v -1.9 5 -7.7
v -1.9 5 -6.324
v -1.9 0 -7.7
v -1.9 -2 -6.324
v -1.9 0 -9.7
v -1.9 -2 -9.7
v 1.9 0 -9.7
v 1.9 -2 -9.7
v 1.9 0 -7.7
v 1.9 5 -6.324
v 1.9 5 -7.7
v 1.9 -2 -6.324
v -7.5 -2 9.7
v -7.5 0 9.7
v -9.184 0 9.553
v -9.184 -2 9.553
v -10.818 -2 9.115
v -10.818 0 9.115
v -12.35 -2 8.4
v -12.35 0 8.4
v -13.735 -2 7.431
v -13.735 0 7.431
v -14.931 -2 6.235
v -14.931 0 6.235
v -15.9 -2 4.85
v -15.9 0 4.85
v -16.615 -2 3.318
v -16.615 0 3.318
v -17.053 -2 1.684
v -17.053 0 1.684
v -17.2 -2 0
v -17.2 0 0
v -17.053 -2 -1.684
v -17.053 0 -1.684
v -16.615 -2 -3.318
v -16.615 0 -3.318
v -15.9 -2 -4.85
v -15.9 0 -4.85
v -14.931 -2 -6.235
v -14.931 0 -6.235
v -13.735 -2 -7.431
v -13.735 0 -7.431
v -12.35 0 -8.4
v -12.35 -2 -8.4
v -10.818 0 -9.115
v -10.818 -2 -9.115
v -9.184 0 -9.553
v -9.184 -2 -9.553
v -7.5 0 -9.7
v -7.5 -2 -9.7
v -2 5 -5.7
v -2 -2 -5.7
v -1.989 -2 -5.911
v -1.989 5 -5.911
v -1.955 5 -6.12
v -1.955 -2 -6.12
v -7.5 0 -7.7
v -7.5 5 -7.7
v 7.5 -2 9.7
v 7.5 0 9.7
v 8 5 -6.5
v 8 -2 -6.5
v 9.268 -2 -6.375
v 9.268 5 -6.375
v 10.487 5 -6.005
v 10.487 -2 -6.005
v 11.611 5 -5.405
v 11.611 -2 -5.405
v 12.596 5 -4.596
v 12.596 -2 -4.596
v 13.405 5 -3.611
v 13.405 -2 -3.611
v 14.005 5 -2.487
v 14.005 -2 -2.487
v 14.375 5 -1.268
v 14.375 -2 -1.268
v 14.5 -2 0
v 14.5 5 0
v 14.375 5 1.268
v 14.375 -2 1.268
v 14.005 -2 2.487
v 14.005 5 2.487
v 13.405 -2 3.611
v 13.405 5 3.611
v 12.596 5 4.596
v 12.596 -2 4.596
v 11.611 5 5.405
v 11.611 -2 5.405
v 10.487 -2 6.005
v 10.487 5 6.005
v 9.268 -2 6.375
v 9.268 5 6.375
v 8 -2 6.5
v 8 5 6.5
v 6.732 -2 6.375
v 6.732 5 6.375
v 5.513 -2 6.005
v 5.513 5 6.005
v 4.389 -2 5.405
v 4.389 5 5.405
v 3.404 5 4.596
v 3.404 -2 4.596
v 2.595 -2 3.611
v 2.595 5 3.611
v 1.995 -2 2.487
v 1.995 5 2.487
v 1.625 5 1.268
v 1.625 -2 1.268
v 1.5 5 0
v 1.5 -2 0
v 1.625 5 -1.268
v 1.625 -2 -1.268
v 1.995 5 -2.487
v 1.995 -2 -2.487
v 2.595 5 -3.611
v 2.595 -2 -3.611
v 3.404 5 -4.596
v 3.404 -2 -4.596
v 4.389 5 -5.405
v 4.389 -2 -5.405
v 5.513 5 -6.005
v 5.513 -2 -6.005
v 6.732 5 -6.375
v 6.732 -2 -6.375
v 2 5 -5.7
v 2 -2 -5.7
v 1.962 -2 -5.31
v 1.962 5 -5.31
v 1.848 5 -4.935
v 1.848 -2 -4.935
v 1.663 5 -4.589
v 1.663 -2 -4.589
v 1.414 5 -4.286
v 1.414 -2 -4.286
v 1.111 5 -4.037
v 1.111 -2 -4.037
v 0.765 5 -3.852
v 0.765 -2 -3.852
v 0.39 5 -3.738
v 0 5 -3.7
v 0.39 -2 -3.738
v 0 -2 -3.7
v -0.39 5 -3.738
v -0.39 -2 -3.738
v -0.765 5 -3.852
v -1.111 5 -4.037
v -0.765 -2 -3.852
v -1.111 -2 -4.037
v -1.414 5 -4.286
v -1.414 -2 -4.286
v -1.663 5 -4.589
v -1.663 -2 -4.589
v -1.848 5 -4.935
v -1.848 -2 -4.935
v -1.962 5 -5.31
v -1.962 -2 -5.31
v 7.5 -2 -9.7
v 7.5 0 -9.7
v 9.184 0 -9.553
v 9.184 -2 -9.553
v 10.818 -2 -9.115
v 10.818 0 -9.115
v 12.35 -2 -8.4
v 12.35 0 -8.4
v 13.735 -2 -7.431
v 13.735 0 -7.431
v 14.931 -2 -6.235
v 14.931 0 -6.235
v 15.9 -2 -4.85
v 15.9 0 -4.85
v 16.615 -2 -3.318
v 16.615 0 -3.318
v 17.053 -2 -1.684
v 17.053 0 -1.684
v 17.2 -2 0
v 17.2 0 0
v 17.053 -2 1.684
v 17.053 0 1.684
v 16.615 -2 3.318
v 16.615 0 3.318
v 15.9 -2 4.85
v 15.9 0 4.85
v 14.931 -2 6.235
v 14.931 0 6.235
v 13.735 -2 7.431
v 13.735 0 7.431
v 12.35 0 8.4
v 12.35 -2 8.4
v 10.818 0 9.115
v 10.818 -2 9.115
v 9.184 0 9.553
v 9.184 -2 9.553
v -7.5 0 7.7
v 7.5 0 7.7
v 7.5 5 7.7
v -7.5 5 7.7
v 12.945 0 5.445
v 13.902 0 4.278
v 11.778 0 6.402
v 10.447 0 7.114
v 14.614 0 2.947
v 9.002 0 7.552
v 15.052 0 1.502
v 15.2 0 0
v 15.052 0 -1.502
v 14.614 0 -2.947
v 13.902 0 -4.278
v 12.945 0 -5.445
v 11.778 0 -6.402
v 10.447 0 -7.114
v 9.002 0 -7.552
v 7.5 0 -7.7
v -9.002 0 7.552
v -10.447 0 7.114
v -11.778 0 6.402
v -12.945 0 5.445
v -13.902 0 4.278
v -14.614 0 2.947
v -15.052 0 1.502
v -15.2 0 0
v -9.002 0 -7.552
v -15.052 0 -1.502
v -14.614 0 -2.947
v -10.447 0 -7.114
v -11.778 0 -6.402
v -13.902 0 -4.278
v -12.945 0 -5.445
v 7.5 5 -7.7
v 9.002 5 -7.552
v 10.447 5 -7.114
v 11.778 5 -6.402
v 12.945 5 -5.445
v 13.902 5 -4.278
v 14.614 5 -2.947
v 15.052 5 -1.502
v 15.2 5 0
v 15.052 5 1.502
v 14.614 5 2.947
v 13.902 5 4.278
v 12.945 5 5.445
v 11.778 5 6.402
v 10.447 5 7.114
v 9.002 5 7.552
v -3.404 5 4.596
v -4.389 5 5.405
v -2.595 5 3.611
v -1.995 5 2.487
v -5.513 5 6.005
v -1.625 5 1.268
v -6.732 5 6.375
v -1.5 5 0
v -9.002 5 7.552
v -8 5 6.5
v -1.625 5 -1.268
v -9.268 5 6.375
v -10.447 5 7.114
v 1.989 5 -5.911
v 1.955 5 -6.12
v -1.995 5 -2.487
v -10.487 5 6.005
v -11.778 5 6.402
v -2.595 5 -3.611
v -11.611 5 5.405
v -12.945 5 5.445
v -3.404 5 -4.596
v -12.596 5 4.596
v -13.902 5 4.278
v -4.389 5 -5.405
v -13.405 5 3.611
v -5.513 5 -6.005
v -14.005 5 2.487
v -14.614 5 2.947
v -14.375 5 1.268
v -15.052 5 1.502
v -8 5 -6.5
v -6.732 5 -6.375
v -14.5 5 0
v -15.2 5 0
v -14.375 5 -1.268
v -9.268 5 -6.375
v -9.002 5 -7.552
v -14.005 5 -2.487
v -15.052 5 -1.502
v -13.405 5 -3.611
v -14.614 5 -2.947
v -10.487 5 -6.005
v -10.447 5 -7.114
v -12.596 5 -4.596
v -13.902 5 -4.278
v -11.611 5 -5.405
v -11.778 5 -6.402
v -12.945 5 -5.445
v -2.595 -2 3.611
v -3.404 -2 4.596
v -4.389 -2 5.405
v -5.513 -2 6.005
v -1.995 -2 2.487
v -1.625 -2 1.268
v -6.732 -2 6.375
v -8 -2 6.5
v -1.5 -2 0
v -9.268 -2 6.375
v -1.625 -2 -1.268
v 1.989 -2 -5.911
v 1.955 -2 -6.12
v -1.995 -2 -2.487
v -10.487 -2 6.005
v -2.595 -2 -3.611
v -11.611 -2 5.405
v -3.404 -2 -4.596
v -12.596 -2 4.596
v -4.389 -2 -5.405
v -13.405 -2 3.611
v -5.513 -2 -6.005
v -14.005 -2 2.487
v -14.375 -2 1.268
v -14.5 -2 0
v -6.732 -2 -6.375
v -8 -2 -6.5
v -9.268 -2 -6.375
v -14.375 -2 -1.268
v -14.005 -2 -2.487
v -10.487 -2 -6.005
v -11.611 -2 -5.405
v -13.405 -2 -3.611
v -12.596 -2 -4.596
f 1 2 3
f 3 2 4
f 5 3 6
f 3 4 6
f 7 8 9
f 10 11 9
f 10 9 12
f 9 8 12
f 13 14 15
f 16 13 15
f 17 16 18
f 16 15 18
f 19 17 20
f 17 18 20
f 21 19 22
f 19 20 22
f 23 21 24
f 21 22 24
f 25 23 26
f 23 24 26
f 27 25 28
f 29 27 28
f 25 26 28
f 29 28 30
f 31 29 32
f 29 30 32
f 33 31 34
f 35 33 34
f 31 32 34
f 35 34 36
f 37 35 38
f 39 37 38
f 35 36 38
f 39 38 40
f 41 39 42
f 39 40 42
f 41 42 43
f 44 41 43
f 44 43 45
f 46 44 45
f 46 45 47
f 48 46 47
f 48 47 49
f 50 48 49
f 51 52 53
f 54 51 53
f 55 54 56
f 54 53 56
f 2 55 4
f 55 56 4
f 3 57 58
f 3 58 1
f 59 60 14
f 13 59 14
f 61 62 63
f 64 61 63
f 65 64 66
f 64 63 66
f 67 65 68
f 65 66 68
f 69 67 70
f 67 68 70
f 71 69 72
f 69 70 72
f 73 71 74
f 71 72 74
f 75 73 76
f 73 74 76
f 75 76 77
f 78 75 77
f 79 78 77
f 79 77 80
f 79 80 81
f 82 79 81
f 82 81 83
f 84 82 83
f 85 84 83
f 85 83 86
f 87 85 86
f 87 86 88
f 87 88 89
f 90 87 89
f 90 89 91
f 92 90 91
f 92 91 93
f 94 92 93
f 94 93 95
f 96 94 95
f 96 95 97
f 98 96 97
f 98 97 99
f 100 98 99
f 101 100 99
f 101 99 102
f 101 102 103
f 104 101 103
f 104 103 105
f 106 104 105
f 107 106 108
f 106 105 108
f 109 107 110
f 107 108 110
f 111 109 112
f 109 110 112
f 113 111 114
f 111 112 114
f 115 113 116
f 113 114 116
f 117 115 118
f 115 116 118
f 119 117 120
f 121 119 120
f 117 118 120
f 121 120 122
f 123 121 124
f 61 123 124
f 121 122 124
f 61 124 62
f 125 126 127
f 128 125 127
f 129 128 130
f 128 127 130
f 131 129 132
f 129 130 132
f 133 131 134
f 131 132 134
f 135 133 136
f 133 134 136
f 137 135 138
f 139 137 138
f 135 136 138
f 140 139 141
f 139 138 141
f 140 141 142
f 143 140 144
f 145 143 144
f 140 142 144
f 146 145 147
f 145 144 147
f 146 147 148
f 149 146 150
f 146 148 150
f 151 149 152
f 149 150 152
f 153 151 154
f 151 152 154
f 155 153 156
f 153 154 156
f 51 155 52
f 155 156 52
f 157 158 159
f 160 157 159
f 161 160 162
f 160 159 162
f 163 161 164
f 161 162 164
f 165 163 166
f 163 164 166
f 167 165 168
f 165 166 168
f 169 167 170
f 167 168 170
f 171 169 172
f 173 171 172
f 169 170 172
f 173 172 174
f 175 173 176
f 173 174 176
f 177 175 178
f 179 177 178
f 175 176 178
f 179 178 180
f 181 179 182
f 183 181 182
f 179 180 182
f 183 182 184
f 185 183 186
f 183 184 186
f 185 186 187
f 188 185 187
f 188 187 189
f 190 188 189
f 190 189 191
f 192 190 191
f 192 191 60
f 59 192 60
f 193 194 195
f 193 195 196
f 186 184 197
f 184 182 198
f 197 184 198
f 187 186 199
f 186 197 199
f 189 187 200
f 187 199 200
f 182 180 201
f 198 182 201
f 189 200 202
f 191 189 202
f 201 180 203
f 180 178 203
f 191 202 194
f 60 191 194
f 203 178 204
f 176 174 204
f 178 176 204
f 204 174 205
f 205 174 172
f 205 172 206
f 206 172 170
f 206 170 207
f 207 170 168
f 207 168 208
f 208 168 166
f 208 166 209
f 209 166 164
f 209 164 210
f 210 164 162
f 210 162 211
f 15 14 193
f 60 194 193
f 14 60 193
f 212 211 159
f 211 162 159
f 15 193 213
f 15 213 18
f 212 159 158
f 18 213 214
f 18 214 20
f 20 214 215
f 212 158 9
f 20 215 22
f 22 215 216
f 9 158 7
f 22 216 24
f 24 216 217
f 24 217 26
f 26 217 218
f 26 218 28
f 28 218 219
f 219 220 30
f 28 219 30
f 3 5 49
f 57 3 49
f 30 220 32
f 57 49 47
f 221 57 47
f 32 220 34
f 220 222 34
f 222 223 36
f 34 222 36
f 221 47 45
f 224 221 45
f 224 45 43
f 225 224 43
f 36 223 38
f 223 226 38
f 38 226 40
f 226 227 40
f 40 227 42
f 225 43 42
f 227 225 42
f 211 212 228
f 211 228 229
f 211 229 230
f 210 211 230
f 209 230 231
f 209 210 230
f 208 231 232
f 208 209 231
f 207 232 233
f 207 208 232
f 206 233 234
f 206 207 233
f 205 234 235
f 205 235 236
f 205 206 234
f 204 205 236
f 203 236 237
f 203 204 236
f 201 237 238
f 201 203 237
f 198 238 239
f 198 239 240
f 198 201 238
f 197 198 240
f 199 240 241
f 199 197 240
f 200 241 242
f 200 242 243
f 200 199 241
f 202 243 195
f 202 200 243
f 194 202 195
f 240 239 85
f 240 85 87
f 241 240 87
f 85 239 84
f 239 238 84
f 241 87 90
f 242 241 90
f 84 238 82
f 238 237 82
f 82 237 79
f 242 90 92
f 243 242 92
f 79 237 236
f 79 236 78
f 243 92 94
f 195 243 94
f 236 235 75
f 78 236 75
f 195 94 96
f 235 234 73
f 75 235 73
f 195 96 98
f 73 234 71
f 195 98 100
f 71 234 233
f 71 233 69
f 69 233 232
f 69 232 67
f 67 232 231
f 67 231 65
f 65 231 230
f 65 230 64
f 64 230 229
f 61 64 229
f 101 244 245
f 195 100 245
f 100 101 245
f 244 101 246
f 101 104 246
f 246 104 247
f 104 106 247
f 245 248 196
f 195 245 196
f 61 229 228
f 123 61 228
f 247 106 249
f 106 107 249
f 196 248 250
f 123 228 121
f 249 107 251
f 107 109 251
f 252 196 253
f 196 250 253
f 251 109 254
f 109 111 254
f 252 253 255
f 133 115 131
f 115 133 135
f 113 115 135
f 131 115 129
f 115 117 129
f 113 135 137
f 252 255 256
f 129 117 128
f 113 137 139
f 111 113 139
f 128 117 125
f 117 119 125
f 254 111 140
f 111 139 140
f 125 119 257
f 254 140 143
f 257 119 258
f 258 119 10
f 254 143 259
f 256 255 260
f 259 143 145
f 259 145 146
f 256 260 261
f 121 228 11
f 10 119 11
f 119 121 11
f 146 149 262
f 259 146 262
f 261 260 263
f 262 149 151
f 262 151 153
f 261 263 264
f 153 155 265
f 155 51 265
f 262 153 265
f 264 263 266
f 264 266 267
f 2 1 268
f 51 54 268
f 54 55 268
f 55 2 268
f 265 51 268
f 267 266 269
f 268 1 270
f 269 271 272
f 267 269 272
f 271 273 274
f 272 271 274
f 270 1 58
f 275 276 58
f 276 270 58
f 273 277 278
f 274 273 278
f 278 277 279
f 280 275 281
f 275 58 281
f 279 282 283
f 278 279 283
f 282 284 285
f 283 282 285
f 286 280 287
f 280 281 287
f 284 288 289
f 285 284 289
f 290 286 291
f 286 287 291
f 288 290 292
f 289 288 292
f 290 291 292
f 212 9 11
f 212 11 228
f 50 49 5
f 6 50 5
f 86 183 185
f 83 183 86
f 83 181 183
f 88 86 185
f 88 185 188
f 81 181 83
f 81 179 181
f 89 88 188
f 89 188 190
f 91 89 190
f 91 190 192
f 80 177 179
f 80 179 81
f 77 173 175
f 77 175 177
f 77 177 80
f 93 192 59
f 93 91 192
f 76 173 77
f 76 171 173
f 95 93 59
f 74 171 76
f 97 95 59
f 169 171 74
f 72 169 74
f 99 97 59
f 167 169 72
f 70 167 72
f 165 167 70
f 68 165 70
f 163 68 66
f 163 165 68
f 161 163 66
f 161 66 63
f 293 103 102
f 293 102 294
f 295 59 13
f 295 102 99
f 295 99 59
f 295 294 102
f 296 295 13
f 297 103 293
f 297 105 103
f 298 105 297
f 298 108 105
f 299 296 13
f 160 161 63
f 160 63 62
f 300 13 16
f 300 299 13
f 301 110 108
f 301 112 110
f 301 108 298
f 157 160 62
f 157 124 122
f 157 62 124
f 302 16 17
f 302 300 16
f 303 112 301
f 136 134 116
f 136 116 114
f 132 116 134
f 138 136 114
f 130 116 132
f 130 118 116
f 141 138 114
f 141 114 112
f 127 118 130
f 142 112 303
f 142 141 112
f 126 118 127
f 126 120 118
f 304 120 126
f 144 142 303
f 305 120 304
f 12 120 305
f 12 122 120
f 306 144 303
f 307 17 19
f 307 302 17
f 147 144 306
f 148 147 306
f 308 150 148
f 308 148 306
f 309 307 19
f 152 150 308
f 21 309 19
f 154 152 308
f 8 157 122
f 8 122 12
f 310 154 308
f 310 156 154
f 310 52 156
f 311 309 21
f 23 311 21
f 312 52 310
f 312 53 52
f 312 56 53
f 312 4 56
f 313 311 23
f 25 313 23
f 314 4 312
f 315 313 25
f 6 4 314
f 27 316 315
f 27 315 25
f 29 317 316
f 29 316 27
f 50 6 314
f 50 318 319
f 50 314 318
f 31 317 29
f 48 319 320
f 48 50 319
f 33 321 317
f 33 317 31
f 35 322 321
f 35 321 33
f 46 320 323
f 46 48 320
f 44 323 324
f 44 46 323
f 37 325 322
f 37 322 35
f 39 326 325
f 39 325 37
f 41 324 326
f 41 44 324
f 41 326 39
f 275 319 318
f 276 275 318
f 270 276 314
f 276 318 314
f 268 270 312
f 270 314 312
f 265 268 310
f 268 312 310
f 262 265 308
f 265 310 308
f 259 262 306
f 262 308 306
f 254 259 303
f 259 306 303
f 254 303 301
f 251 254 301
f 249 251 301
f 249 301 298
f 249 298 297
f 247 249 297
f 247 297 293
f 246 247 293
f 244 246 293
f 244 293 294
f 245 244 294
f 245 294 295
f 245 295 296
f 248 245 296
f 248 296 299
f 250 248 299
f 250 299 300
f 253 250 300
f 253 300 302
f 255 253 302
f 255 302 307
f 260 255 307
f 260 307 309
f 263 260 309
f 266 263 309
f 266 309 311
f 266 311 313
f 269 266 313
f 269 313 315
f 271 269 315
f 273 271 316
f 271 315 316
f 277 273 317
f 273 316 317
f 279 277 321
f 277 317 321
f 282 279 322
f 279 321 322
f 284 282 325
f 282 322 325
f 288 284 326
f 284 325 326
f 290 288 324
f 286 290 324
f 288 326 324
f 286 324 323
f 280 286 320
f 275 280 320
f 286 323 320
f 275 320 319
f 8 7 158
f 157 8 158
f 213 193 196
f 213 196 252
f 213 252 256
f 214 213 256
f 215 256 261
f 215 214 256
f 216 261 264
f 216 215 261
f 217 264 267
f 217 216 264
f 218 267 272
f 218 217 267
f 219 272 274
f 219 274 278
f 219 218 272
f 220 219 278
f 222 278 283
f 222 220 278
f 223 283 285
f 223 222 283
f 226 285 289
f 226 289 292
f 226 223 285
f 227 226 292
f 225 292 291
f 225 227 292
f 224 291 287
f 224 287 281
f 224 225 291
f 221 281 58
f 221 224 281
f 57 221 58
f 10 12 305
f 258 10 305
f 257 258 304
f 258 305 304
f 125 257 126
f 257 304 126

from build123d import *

# Parameters (mm, degrees)
EXTRUDE_1_DEPTH     = 2
EXTRUDE_2_DEPTH     = 5
CUT_EXTRUDE_1_REACH = 22.951
SKETCH_3_R          = 6.5


with BuildPart() as part:
    # 草圖2 → 填料-伸長1 (new body)
    with BuildSketch(Plane(origin=(0, 0, 0), x_dir=(1, 0, 0), z_dir=(0, 1, 0))):
        with BuildLine():
            Line((-7.5, 9.7), (7.5, 9.7))
            ThreePointArc((7.5, 9.7), (17.2, 0), (7.5, -9.7))
            Line((7.5, -9.7), (-7.5, -9.7))
            ThreePointArc((-7.5, -9.7), (-17.2, 0), (-7.5, 9.7))
        make_face()
    extrude(amount=-EXTRUDE_1_DEPTH)

    # 草圖1 → 填料-伸長2 (add)
    with BuildSketch(Plane(origin=(0, 0, 0), x_dir=(1, 0, 0), z_dir=(0, 1, 0))):
        with BuildLine():
            Line((-7.5, 7.7), (7.5, 7.7))
            ThreePointArc((7.5, 7.7), (15.2, 0), (7.5, -7.7))
            Line((7.5, -7.7), (-7.5, -7.7))
            ThreePointArc((-7.5, -7.7), (-15.2, 0), (-7.5, 7.7))
        make_face()
    extrude(amount=EXTRUDE_2_DEPTH)

    # 草圖3 → 除料-伸長1 (cut, up to next)
    with BuildSketch(Plane.XZ.offset(2), mode=Mode.PRIVATE) as cut_extrude_1_sk1:
        with Locations(Location((-8, 0, 0), (0, 0, 270))):
            Circle(SKETCH_3_R)
    cut_extrude_1_tool1 = extrude(cut_extrude_1_sk1.sketch, amount=-CUT_EXTRUDE_1_REACH, mode=Mode.PRIVATE) & part.part
    # 草圖3 → 除料-伸長1 (cut, up to next)
    with BuildSketch(Plane.XZ.offset(2), mode=Mode.PRIVATE) as cut_extrude_1_sk2:
        with Locations(Location((8, 0, 0), (0, 0, 270))):
            Circle(SKETCH_3_R)
    cut_extrude_1_tool2 = extrude(cut_extrude_1_sk2.sketch, amount=-CUT_EXTRUDE_1_REACH, mode=Mode.PRIVATE) & part.part
    # 草圖3 → 除料-伸長1 (cut, up to next)
    with BuildSketch(Plane.XZ.offset(2), mode=Mode.PRIVATE) as cut_extrude_1_sk3:
        with BuildLine():
            ThreePointArc((2, -5.7), (0, -3.7), (-2, -5.7))
            Line((-2, -5.7), (2, -5.7))
        make_face()
    cut_extrude_1_tool3 = extrude(cut_extrude_1_sk3.sketch, amount=-CUT_EXTRUDE_1_REACH, mode=Mode.PRIVATE) & part.part
    # 草圖3 → 除料-伸長1 (cut, up to next)
    with BuildSketch(Plane.XZ.offset(2), mode=Mode.PRIVATE) as cut_extrude_1_sk4:
        with BuildLine():
            Line((2, -5.7), (-2, -5.7))
            ThreePointArc((-2, -5.7), (-1.974841766, -6.016227766), (-1.9, -6.3244998))
            Line((-1.9, -6.3244998), (-1.9, -9.7))
            Line((-1.9, -9.7), (1.9, -9.7))
            Line((1.9, -9.7), (1.9, -6.3244998))
            ThreePointArc((1.9, -6.3244998), (1.974841766, -6.016227766), (2, -5.7))
        make_face()
    cut_extrude_1_tool4 = extrude(cut_extrude_1_sk4.sketch, amount=-CUT_EXTRUDE_1_REACH, mode=Mode.PRIVATE) & part.part
    add(cut_extrude_1_tool1.solids().sort_by_distance((-8, -2, 0))[0], mode=Mode.SUBTRACT)
    add(cut_extrude_1_tool2.solids().sort_by_distance((8, -2, 0))[0], mode=Mode.SUBTRACT)
    add(cut_extrude_1_tool3.solids().sort_by_distance((0, -2, -4.851174))[0], mode=Mode.SUBTRACT)
    add(cut_extrude_1_tool4.solids().sort_by_distance((0, -2, -7.690335))[0], mode=Mode.SUBTRACT)


solid = part.part
